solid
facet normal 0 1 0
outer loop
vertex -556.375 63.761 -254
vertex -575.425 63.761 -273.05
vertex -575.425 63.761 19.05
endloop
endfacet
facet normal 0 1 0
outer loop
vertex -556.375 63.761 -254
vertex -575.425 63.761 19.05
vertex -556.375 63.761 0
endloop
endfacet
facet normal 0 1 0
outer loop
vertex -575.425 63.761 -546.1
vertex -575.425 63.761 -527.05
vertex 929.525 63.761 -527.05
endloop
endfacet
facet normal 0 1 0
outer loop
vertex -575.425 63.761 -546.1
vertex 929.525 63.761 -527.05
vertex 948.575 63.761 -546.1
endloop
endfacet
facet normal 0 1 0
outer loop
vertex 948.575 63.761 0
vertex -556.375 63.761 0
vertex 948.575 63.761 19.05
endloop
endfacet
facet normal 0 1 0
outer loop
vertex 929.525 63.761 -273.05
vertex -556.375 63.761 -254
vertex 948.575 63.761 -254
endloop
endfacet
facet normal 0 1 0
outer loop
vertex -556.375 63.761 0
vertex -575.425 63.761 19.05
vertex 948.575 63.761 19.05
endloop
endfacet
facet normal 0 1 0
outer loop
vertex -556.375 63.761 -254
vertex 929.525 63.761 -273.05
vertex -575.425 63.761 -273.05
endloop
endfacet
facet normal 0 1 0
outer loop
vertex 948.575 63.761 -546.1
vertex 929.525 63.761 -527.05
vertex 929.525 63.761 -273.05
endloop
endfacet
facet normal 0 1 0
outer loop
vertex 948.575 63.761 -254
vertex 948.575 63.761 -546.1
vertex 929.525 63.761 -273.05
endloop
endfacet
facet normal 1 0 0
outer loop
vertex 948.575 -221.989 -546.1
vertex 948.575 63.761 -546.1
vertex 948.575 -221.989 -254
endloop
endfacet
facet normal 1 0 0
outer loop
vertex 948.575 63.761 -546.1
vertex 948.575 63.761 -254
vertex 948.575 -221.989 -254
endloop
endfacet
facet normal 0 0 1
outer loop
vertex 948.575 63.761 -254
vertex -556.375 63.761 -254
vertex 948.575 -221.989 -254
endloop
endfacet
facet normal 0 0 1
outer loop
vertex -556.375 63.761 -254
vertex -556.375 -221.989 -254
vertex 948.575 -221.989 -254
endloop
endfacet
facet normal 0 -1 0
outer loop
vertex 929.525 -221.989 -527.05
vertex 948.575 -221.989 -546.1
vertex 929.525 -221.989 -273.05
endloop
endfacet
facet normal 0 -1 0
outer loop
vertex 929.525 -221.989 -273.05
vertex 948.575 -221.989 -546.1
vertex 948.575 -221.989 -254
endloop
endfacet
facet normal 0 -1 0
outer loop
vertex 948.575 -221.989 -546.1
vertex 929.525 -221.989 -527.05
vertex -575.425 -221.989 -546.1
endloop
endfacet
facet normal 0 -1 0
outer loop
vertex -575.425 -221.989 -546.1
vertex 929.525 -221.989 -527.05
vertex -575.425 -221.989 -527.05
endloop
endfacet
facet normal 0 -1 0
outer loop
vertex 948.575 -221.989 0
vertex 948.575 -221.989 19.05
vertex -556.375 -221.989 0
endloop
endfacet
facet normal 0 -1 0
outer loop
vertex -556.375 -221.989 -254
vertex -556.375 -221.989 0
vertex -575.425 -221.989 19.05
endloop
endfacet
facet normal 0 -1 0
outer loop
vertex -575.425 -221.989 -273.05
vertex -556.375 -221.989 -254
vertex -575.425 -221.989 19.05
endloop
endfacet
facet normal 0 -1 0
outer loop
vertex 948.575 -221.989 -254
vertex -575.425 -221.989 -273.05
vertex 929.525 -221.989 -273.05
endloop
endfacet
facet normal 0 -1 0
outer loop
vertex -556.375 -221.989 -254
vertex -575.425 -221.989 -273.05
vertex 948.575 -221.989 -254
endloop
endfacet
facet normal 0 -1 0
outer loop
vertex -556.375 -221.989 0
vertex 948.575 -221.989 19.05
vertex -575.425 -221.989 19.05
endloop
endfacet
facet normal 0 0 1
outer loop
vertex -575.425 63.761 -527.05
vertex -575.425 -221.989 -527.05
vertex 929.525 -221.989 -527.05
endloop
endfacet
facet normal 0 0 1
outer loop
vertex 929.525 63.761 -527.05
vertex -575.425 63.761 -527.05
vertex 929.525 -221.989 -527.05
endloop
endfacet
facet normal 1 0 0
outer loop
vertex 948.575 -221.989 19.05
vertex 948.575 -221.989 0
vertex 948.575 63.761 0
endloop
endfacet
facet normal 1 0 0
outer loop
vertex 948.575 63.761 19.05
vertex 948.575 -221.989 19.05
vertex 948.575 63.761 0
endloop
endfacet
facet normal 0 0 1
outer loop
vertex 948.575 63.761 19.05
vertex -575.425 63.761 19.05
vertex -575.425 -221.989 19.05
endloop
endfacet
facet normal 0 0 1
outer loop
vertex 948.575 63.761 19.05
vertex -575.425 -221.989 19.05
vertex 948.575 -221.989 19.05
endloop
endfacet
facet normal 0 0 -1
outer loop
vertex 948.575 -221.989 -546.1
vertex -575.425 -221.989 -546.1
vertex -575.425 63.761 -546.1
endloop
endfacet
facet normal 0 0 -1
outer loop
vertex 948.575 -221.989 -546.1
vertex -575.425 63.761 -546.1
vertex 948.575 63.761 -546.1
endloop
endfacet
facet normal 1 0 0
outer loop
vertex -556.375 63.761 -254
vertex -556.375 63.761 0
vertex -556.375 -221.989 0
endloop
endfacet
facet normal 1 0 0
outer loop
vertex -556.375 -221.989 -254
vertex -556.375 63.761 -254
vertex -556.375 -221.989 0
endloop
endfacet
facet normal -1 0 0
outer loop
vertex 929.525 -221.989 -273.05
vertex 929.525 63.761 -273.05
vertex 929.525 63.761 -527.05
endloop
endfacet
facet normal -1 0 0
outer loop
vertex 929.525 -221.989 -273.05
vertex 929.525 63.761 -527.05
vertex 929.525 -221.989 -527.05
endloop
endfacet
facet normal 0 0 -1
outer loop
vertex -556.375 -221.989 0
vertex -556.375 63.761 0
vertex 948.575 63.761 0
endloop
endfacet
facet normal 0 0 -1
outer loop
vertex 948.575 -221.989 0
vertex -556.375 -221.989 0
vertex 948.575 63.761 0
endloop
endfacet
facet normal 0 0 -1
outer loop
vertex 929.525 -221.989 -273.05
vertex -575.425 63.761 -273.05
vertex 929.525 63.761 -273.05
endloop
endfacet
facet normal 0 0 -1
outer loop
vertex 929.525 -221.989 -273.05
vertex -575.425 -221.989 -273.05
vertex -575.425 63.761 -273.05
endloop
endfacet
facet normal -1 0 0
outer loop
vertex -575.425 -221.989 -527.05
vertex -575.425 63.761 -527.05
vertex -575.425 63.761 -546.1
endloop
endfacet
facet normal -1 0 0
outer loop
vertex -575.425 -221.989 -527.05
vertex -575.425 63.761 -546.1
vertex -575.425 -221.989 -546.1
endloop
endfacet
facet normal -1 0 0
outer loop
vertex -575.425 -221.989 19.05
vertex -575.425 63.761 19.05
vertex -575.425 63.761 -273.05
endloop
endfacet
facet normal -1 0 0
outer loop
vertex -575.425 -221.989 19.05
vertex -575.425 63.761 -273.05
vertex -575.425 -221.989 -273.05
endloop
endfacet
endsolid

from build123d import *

# Parameters (mm, degrees)
F0_W     = 1524
F0_H     = 285.75
F1_DEPTH = 19.05
F2_W     = 19.05
F2_H     = 285.75
F3_DEPTH = 254
F4_W     = 1504.95
F4_H     = 285.75
F4_W_2   = 19.05
F5_DEPTH = 19.05
F6_W     = 19.05
F6_H     = 285.75
F7_DEPTH = 254
F8_W     = 1504.95
F8_H     = 285.75
F8_W_2   = 19.05
F9_DEPTH = 19.05


with BuildPart() as f1:
    # F0 (on Top) → F1 (new body)
    with BuildSketch(Plane.XY):
        with Locations((186.574653, -79.114271)):
            Rectangle(F0_W, F0_H)
    extrude(amount=F1_DEPTH)

    # F2 (on face) → F3 (join)
    with BuildSketch(Plane(origin=(0, 0, 0), x_dir=(1, 0, 0), z_dir=(0, 0, -1))):
        with Locations((-565.900347, 79.114271)):
            Rectangle(F2_W, F2_H)
    extrude(amount=F3_DEPTH)

    # F4 (on face) → F5 (join)
    with BuildSketch(Plane(origin=(0, 0, -254), x_dir=(1, 0, 0), z_dir=(0, 0, -1))):
        with Locations((196.099653, 79.114271)):
            Rectangle(F4_W, F4_H)
        with Locations((-565.900347, 79.114271)):
            Rectangle(F4_W_2, F4_H)
    extrude(amount=F5_DEPTH)

    # F6 (on face) → F7 (join)
    with BuildSketch(Plane(origin=(0, 0, -273.05), x_dir=(1, 0, 0), z_dir=(0, 0, -1))):
        with Locations((939.049653, 79.114271)):
            Rectangle(F6_W, F6_H)
    extrude(amount=F7_DEPTH)

    # F8 (on face) → F9 (join)
    with BuildSketch(Plane(origin=(0, 0, -527.05), x_dir=(1, 0, 0), z_dir=(0, 0, -1))):
        with Locations((177.049653, 79.114271)):
            Rectangle(F8_W, F8_H)
        with Locations((939.049653, 79.114271)):
            Rectangle(F8_W_2, F8_H)
    extrude(amount=F9_DEPTH)


solid = f1.part
